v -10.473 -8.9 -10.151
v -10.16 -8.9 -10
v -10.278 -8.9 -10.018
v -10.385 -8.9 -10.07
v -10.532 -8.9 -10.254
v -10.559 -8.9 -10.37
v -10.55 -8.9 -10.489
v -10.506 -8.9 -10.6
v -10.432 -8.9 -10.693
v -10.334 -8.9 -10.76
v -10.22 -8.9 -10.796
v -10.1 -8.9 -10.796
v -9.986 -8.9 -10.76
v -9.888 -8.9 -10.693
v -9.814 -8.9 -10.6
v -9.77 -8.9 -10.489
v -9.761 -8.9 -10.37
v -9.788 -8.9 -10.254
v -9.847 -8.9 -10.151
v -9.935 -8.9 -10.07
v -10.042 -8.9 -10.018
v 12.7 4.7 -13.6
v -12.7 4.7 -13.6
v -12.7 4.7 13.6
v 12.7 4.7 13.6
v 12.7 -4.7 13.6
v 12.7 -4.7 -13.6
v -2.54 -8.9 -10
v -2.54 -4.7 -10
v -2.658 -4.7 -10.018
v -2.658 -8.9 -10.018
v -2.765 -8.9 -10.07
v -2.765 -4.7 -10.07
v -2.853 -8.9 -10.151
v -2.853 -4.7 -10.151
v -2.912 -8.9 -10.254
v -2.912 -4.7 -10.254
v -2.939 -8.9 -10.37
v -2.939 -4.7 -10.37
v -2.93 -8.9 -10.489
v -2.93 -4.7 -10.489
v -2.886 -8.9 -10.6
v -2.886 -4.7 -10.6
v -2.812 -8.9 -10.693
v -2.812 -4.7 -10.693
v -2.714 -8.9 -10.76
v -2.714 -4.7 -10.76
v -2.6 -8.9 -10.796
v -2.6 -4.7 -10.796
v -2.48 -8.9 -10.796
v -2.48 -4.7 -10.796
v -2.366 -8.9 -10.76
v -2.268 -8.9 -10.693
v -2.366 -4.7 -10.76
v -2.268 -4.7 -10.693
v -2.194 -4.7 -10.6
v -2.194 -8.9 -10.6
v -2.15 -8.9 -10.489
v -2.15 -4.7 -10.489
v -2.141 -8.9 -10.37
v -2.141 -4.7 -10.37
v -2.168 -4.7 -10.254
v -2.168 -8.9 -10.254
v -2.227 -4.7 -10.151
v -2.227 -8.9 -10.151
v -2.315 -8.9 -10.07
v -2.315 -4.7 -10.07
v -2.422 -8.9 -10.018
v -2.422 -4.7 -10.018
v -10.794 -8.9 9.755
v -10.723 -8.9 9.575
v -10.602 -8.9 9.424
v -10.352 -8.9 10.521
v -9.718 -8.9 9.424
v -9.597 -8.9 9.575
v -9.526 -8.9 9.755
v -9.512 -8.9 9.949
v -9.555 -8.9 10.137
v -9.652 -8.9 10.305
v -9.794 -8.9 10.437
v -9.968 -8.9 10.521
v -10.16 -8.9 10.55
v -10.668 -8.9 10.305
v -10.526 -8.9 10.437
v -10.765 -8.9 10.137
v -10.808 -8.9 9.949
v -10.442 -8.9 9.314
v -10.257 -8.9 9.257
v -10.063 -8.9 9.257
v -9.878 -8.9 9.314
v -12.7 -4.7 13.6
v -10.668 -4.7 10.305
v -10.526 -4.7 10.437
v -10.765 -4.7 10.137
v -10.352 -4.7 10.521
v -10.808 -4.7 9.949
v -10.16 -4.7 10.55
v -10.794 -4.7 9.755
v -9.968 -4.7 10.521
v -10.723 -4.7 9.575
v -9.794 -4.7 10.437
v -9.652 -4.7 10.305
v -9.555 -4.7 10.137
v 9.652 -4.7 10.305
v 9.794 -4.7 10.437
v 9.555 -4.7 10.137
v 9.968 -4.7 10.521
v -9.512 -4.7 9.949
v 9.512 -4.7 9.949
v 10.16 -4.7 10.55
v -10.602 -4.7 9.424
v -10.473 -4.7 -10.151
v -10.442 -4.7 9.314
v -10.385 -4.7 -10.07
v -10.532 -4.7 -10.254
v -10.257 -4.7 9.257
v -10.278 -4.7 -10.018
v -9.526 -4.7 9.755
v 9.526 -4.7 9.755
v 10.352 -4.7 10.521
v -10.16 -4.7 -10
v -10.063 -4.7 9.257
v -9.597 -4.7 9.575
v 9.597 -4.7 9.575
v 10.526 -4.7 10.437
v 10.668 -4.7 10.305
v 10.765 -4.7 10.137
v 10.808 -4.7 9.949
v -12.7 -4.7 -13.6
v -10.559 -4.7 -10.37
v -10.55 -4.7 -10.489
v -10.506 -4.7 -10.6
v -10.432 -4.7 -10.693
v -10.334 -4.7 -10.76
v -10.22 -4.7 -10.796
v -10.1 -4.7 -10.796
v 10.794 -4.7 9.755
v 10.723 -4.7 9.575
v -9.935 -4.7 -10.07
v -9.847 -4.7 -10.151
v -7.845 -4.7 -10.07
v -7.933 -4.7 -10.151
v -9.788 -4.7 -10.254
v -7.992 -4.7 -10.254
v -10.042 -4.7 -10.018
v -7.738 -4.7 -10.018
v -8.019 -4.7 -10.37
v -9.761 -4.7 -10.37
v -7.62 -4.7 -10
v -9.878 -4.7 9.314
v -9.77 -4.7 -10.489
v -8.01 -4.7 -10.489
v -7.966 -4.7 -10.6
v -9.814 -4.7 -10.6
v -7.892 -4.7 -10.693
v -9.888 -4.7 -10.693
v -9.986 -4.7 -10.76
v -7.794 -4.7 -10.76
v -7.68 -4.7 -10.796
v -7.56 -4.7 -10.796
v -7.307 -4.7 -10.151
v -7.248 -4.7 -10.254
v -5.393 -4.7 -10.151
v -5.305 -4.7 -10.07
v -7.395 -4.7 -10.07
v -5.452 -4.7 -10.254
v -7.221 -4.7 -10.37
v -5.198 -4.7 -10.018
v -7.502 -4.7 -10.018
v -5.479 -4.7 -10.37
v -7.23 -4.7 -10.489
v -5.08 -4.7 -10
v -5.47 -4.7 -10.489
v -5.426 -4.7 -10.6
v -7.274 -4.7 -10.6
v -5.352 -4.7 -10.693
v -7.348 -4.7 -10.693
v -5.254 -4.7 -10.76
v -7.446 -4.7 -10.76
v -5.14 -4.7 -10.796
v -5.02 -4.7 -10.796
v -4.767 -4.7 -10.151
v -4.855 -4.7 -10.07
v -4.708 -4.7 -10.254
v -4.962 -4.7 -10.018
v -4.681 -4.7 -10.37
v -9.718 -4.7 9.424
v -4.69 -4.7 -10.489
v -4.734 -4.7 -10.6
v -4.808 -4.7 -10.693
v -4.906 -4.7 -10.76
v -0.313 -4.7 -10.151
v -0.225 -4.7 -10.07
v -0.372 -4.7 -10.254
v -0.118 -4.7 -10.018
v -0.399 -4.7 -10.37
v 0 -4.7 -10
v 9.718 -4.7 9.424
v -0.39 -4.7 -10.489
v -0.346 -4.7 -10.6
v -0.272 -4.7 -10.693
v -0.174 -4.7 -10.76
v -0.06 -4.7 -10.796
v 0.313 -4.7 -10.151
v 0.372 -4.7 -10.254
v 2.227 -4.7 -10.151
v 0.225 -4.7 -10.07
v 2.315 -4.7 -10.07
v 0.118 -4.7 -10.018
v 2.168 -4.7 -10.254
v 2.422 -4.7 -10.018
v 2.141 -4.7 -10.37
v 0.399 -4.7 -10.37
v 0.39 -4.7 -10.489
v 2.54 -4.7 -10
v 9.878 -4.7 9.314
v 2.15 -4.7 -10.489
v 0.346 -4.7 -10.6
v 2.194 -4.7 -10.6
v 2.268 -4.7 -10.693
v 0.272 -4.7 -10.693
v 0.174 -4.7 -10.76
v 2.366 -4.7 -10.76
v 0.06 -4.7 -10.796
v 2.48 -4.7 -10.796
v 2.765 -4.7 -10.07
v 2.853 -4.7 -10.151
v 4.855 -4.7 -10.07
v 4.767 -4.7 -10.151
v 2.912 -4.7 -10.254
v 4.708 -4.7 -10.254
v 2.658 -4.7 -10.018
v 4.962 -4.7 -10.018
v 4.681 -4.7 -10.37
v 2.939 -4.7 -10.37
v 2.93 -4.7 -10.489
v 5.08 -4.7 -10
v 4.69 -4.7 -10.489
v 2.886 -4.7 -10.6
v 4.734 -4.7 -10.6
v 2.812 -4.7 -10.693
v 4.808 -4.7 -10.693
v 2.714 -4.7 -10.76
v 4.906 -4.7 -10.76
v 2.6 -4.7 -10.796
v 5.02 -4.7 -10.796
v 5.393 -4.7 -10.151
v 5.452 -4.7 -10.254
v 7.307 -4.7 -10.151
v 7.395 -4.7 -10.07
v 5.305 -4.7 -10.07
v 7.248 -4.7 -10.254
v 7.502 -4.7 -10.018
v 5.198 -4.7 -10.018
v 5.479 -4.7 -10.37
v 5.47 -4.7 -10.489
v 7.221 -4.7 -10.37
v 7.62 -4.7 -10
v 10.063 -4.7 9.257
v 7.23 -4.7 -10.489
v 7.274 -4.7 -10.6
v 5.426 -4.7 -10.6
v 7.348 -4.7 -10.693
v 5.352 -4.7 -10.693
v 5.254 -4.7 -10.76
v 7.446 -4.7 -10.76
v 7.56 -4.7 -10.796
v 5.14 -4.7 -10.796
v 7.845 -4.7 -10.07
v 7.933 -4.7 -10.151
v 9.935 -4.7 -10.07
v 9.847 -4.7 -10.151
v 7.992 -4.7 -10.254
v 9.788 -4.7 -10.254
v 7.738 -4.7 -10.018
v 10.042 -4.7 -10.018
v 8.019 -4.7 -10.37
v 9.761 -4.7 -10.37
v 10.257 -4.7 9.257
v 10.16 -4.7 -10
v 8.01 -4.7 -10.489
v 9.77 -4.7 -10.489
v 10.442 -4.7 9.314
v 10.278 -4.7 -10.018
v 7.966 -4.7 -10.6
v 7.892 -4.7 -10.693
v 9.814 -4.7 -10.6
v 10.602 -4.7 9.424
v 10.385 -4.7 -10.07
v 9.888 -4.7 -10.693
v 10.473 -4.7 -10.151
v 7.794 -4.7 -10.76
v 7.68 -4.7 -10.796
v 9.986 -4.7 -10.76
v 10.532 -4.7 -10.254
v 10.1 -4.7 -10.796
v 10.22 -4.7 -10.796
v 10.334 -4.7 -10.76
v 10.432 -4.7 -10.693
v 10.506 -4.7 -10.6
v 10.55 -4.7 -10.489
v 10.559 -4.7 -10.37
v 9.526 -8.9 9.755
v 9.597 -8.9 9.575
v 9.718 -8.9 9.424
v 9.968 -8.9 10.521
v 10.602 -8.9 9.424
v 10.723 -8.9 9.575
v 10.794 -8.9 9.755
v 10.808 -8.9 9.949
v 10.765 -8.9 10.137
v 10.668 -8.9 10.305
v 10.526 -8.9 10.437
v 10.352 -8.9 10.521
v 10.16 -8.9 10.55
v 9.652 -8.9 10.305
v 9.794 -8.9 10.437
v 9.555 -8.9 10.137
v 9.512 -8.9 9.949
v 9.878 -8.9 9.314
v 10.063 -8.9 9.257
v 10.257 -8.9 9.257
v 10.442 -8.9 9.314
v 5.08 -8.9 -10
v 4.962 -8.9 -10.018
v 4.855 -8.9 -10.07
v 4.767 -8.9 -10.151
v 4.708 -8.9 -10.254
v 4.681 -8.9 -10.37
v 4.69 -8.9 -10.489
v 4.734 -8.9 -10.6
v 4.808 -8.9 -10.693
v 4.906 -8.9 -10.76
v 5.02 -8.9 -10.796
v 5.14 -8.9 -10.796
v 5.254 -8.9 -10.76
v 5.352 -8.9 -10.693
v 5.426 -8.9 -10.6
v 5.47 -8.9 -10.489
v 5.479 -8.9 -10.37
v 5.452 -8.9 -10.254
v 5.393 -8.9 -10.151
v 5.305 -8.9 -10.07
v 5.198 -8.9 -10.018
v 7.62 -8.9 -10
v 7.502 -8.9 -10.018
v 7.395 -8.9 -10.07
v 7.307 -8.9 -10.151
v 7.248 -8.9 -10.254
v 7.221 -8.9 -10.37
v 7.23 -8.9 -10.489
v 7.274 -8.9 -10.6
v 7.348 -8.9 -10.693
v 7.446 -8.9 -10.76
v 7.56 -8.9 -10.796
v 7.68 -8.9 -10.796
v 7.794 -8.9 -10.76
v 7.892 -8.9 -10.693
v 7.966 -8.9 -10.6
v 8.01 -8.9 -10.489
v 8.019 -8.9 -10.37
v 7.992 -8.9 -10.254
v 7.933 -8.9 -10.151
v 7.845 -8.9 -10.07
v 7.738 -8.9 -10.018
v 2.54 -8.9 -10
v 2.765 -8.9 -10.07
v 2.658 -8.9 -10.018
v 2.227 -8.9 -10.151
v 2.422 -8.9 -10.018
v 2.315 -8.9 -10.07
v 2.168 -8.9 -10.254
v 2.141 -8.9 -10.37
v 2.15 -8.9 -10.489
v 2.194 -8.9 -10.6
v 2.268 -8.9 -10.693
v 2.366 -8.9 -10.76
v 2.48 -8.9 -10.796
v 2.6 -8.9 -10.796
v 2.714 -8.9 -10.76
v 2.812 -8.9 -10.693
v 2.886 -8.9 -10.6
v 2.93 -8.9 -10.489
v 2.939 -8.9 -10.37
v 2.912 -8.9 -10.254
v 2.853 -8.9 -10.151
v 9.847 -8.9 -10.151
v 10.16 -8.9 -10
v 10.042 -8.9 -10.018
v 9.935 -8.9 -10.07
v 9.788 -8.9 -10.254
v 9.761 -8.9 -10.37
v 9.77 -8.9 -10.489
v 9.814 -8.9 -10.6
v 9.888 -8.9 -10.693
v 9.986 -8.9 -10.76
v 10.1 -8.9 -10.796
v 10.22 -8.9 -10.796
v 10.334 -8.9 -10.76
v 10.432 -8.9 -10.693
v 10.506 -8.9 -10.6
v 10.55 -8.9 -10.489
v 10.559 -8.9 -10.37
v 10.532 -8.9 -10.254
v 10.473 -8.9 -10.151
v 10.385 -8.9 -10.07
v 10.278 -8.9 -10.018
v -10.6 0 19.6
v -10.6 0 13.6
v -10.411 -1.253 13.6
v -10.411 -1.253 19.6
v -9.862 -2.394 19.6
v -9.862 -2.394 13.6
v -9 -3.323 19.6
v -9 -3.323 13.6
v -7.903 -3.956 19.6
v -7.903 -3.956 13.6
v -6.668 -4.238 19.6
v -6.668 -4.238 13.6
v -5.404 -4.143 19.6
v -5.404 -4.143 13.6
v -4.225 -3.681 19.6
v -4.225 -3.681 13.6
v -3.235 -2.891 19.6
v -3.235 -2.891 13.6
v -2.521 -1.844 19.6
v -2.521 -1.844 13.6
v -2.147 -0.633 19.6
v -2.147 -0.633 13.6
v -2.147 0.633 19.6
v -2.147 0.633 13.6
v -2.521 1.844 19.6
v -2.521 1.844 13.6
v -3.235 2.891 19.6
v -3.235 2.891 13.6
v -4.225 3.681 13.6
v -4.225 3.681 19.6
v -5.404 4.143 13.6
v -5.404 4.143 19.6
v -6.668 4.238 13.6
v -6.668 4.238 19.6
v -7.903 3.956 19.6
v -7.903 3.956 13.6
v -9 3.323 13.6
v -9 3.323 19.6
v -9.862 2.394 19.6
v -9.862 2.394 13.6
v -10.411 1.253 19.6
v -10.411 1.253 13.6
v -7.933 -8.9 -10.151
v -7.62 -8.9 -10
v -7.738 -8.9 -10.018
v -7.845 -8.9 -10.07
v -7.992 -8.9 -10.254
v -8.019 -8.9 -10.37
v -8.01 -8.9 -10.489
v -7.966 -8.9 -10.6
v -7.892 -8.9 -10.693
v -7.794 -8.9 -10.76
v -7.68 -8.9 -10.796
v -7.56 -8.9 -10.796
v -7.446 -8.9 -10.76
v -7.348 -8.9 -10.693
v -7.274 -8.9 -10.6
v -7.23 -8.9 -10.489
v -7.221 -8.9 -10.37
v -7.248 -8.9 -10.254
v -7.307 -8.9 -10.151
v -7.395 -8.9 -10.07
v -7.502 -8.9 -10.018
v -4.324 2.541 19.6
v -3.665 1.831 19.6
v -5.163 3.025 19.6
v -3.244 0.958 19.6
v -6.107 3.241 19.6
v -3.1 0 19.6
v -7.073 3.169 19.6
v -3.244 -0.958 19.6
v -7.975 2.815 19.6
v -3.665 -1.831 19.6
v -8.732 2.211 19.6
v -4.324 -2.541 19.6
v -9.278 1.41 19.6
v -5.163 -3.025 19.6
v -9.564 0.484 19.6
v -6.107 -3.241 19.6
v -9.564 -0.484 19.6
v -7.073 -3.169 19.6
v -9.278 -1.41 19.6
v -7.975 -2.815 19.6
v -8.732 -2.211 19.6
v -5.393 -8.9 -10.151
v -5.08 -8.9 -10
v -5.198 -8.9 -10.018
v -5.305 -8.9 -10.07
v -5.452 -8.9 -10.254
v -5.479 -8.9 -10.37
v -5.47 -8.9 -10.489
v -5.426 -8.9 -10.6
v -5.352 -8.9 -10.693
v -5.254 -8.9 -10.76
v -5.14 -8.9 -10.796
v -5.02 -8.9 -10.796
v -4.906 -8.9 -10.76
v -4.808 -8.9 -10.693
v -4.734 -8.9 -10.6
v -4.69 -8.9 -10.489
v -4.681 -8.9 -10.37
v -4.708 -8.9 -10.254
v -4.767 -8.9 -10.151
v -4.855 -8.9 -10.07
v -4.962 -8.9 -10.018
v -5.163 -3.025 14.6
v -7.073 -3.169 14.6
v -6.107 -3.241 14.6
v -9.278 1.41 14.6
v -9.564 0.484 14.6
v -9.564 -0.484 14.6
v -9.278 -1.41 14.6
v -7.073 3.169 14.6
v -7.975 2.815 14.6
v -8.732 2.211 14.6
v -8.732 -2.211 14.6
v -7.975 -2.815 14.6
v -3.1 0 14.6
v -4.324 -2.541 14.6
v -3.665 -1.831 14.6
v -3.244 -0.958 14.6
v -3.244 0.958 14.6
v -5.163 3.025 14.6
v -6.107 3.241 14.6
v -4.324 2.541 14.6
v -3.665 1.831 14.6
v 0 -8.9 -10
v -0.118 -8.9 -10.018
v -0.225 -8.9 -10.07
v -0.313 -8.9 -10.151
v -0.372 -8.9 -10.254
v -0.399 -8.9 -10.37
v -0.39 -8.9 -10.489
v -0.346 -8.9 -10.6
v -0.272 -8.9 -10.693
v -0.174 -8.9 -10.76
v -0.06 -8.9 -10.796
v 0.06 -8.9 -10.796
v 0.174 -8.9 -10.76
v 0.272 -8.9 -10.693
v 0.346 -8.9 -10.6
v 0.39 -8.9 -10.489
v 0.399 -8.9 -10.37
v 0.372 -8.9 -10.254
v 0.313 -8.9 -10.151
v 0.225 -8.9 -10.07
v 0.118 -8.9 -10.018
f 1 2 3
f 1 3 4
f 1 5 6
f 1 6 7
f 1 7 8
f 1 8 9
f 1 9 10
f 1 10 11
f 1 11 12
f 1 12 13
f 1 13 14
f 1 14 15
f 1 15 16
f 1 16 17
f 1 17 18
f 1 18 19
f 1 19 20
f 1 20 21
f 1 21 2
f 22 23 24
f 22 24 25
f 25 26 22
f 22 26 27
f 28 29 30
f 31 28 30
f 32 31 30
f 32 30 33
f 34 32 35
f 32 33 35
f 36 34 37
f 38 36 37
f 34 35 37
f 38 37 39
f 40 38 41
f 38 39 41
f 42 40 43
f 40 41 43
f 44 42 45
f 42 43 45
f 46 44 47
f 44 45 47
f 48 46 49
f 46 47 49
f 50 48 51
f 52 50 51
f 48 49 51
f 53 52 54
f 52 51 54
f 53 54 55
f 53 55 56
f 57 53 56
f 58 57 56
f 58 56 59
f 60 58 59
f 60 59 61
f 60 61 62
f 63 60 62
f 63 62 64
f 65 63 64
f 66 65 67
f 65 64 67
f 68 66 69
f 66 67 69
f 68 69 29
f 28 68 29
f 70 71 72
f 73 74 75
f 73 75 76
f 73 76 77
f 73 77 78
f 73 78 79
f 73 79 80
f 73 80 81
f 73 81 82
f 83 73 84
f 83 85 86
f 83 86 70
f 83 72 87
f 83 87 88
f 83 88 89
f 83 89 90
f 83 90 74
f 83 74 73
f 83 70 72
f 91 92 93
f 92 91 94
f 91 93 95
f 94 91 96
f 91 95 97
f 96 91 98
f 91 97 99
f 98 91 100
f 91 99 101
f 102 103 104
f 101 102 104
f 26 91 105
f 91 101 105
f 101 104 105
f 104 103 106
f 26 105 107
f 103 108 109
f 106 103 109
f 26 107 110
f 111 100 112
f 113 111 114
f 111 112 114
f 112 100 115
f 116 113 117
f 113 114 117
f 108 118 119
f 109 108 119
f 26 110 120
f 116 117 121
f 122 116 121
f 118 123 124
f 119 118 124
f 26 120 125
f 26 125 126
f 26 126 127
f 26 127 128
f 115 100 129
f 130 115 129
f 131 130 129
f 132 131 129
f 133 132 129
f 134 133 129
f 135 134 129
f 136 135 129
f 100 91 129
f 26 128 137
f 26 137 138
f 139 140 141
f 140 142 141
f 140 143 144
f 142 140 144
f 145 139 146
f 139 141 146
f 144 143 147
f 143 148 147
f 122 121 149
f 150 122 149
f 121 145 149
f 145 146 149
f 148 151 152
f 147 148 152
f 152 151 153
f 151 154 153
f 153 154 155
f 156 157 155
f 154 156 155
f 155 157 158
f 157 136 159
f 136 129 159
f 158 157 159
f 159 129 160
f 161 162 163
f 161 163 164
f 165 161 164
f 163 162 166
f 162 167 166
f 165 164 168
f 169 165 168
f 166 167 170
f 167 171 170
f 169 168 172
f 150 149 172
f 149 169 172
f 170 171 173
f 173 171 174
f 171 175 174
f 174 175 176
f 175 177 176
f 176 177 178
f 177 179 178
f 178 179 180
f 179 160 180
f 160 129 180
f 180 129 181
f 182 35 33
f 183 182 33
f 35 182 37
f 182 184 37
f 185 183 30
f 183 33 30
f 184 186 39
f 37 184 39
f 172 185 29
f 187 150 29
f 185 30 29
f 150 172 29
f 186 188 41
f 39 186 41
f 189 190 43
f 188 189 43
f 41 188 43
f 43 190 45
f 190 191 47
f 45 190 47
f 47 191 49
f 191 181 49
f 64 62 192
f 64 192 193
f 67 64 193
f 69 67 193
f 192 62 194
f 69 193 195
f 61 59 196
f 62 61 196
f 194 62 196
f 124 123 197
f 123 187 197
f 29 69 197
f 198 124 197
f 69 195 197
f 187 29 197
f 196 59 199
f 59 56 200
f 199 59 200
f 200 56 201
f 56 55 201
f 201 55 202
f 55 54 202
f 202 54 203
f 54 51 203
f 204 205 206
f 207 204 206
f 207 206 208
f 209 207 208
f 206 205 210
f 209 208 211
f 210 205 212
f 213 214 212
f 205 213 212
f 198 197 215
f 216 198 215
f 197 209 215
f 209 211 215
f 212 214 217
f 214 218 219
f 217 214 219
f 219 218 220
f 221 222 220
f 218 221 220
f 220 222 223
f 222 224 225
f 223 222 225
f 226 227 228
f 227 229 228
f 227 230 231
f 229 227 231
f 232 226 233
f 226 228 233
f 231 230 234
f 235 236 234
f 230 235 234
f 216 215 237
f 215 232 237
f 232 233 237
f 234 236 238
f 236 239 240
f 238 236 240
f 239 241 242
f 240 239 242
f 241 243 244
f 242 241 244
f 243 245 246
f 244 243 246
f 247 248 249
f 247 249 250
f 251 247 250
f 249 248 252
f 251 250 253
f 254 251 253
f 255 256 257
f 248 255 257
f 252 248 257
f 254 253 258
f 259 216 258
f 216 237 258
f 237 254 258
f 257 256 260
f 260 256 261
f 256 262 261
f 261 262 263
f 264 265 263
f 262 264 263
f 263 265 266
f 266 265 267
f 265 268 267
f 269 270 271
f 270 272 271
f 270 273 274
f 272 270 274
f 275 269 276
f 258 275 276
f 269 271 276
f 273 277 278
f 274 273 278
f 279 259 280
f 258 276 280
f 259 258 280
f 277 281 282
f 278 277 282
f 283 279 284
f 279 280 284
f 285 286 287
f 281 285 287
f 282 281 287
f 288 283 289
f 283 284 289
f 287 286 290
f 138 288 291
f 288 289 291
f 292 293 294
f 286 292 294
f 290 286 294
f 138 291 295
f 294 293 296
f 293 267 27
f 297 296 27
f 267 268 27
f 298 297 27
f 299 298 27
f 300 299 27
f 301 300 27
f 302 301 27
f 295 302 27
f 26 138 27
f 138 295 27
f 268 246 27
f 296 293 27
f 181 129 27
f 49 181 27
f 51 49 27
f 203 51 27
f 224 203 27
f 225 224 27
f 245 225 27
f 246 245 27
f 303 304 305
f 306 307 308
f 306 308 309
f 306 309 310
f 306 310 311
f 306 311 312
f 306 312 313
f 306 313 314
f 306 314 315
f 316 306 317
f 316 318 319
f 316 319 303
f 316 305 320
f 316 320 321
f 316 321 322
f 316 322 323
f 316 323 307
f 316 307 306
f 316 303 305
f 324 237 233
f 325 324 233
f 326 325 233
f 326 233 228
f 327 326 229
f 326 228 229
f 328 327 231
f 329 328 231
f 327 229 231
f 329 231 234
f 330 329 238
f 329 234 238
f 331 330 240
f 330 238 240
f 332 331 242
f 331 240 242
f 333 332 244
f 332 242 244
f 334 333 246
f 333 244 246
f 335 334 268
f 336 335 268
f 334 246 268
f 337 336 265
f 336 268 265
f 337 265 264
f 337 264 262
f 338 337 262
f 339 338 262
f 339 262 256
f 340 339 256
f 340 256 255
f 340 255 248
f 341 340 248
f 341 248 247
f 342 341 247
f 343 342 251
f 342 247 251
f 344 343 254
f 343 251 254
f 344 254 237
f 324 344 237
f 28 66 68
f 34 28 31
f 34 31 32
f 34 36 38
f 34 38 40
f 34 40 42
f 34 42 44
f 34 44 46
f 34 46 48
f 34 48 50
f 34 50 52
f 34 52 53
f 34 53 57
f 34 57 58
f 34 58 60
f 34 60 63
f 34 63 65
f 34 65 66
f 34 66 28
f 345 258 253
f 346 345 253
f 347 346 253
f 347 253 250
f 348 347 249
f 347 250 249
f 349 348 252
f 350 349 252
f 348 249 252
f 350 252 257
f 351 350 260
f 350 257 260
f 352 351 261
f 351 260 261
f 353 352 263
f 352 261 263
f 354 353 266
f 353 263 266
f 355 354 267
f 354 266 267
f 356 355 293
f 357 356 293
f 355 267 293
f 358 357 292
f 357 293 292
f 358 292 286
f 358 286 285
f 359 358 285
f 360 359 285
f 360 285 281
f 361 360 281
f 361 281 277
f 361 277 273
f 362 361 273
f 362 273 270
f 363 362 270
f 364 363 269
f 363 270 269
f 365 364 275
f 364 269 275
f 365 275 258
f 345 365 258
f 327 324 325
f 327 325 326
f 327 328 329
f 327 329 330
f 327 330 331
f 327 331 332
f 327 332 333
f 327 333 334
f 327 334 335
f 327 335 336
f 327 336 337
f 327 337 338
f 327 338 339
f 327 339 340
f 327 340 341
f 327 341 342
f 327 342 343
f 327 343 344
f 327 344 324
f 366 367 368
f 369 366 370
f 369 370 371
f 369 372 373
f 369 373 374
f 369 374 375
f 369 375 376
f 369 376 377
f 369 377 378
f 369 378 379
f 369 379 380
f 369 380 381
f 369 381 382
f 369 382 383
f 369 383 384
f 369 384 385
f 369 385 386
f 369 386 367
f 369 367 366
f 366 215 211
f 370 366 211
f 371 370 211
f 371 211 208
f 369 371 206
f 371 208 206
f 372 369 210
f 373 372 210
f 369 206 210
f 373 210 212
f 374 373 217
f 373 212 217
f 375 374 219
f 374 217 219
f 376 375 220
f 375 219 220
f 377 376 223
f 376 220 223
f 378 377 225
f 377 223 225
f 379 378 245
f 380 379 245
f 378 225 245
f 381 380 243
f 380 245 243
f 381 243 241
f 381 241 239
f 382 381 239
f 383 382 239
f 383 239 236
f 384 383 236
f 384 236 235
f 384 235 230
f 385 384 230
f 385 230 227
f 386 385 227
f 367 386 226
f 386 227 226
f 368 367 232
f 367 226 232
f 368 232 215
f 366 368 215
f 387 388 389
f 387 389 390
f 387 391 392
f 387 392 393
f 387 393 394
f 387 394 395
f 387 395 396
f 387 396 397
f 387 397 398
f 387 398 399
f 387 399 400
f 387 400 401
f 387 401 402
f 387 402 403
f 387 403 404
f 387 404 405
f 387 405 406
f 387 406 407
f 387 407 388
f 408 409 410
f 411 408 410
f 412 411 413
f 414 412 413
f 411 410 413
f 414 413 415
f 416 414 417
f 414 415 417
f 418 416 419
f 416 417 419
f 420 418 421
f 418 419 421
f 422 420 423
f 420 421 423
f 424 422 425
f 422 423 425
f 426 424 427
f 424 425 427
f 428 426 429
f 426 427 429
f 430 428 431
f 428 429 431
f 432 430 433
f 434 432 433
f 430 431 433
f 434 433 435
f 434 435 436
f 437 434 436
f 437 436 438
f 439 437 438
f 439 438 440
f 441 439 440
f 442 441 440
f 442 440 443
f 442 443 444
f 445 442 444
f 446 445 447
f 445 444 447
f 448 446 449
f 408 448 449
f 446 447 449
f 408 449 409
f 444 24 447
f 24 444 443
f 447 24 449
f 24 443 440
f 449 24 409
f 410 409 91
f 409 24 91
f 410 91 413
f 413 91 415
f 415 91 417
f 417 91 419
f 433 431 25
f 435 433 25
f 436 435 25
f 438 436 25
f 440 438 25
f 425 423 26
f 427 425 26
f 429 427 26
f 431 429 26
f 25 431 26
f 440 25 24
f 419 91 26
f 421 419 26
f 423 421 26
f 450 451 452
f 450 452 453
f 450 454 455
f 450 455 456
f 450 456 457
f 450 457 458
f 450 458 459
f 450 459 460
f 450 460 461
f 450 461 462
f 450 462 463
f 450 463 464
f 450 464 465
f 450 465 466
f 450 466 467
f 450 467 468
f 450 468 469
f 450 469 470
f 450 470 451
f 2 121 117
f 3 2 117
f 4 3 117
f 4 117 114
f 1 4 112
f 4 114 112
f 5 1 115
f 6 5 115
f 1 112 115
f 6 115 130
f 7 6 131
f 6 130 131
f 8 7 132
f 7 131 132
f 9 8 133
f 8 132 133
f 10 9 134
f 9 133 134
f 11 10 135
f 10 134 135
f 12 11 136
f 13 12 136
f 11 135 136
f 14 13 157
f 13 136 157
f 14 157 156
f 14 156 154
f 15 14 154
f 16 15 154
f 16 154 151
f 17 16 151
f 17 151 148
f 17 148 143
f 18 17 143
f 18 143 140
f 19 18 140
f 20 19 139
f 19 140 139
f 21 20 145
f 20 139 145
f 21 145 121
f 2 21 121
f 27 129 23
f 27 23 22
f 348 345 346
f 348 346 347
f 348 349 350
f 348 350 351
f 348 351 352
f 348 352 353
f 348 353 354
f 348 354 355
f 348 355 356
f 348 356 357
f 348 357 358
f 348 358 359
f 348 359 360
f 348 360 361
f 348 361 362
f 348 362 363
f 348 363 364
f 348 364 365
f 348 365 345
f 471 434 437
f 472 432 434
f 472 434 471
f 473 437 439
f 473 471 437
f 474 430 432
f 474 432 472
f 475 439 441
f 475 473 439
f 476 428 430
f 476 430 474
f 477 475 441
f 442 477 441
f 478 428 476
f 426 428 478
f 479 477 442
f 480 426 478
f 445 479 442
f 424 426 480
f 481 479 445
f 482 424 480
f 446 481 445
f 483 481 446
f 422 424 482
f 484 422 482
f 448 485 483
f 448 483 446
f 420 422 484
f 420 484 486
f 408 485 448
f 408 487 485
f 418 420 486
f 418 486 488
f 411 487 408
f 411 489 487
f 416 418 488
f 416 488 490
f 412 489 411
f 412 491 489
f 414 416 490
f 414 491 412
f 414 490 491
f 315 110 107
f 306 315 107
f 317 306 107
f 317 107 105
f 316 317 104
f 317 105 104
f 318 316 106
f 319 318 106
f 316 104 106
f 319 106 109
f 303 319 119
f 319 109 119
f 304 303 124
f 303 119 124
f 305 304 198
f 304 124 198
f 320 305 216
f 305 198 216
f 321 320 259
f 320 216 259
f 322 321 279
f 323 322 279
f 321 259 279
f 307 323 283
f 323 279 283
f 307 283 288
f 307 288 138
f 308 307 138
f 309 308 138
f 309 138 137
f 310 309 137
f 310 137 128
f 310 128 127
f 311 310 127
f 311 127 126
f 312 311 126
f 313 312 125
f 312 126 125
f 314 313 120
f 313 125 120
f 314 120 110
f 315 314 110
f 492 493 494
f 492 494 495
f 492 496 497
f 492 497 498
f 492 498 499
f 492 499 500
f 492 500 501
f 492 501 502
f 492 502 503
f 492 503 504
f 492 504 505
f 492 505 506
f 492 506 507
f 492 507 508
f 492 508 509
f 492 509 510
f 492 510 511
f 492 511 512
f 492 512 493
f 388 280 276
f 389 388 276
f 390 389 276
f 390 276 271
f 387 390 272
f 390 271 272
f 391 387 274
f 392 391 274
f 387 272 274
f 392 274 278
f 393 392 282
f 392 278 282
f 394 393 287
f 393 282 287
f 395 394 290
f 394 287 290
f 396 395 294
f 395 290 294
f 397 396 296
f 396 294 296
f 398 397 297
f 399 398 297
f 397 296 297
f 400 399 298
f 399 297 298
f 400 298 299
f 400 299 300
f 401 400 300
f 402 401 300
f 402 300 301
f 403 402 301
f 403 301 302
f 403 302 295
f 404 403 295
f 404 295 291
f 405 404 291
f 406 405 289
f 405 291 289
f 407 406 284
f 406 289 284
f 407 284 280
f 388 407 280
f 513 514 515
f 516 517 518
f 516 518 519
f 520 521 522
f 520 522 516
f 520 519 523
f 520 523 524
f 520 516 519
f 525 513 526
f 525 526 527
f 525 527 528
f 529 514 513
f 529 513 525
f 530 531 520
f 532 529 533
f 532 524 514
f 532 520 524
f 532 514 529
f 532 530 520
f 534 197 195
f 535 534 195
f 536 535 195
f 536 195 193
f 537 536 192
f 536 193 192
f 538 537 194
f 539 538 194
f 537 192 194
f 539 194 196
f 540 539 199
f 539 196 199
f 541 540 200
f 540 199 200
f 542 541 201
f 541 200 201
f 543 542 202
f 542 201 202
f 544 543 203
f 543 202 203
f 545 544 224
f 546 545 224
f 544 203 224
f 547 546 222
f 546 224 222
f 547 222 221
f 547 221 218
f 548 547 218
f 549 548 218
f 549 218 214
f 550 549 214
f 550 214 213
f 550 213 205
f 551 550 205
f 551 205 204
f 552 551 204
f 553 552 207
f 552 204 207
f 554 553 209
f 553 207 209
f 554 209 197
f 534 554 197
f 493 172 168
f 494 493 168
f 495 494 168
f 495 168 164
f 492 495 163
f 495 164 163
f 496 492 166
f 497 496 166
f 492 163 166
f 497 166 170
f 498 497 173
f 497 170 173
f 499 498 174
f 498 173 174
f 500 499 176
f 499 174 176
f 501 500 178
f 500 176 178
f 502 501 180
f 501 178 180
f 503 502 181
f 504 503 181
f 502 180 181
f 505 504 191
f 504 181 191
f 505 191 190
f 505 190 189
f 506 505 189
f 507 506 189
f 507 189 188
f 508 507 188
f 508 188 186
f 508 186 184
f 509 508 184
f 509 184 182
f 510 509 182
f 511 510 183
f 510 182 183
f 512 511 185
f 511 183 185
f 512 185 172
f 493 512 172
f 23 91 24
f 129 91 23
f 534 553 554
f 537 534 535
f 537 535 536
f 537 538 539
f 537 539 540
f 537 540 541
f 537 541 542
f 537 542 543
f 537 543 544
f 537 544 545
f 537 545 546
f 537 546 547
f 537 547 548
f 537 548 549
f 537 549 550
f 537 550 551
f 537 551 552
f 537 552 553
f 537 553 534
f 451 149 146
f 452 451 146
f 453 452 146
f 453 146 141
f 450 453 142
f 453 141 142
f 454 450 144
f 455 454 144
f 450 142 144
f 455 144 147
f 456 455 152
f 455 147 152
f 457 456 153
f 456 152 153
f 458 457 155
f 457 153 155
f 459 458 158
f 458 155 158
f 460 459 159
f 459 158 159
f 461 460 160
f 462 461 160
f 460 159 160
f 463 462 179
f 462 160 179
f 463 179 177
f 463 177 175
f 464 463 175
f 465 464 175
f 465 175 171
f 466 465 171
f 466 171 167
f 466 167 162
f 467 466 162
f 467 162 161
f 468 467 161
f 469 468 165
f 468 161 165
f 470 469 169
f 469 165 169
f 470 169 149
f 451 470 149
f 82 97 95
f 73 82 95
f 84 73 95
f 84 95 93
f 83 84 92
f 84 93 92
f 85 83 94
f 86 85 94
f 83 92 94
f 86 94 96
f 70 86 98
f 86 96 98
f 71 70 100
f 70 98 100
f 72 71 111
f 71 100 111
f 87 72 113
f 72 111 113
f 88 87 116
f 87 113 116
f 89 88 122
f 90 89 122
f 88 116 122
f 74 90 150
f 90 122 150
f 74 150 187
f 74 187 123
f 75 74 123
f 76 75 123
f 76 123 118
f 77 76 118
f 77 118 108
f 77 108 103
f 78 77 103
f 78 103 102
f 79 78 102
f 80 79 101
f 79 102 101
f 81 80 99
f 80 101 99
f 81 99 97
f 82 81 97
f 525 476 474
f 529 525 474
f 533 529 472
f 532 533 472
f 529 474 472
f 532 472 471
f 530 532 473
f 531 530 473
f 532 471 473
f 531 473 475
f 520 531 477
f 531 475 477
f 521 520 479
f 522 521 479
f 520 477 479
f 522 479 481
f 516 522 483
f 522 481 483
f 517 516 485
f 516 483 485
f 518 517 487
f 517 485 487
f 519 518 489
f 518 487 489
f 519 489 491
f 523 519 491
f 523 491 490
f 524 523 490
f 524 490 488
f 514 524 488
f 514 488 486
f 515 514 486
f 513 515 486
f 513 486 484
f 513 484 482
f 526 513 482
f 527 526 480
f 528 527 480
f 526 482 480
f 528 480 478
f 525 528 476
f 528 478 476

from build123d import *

# Parameters (mm, degrees)
EXTRUDE_1_DEPTH      = 4.7
EXTRUDE_1_DEPTH_BACK = 4.7
SKETCH_1_W           = 25.4
SKETCH_1_H           = 27.2
SKETCH_2_R           = 4.25
EXTRUDE_2_DEPTH      = 6
SKETCH_3_R           = 3.25
CUT_EXTRUDE_1_DEPTH  = 5
SKETCH_4_R           = 0.65
SKETCH_4_R_2         = 0.4
EXTRUDE_3_DEPTH      = 4.2


with BuildPart() as part:
    # 草图1 → 凸台-拉伸1 (new, two sides: drawn at the far end of the back side and taken through both)
    with BuildSketch(Plane(origin=(0, 0, 0), x_dir=(1, 0, 0), z_dir=(0, 1, 0)).offset(-EXTRUDE_1_DEPTH_BACK)):
        Rectangle(SKETCH_1_W, SKETCH_1_H)
    extrude(amount=EXTRUDE_1_DEPTH + EXTRUDE_1_DEPTH_BACK)

    # 草图2 → 凸台-拉伸2 (add)
    with BuildSketch(Plane.XY.offset(13.6)):
        with Locations(Location((-6.35, 0, 0), (0, 0, 180))):
            Circle(SKETCH_2_R)
    extrude(amount=EXTRUDE_2_DEPTH)

    # 草图3 → 切除-拉伸1 (cut)
    with BuildSketch(Plane.XY.offset(19.6)):
        with Locations((-6.35, 0)):
            Circle(SKETCH_3_R)
    extrude(amount=-CUT_EXTRUDE_1_DEPTH, mode=Mode.SUBTRACT)

    # 草图4 → 凸台-拉伸3 (add)
    with BuildSketch(Plane.XZ.offset(4.7)):
        with Locations(Location((-10.16, 9.9, 0), (0, 0, 90))):
            Circle(SKETCH_4_R)
        with Locations(Location((10.16, 9.9, 0), (0, 0, 90))):
            Circle(SKETCH_4_R)
        with Locations(Location((-10.16, -10.4, 0), (0, 0, 90))):
            Circle(SKETCH_4_R_2)
        with Locations(Location((-7.62, -10.4, 0), (0, 0, 90))):
            Circle(SKETCH_4_R_2)
        with Locations(Location((-5.08, -10.4, 0), (0, 0, 90))):
            Circle(SKETCH_4_R_2)
        with Locations(Location((-2.54, -10.4, 0), (0, 0, 90))):
            Circle(SKETCH_4_R_2)
        with Locations(Location((0, -10.4, 0), (0, 0, 90))):
            Circle(SKETCH_4_R_2)
        with Locations(Location((2.54, -10.4, 0), (0, 0, 90))):
            Circle(SKETCH_4_R_2)
        with Locations(Location((5.08, -10.4, 0), (0, 0, 90))):
            Circle(SKETCH_4_R_2)
        with Locations(Location((7.62, -10.4, 0), (0, 0, 90))):
            Circle(SKETCH_4_R_2)
        with Locations(Location((10.16, -10.4, 0), (0, 0, 90))):
            Circle(SKETCH_4_R_2)
    extrude(amount=EXTRUDE_3_DEPTH)


solid = part.part
